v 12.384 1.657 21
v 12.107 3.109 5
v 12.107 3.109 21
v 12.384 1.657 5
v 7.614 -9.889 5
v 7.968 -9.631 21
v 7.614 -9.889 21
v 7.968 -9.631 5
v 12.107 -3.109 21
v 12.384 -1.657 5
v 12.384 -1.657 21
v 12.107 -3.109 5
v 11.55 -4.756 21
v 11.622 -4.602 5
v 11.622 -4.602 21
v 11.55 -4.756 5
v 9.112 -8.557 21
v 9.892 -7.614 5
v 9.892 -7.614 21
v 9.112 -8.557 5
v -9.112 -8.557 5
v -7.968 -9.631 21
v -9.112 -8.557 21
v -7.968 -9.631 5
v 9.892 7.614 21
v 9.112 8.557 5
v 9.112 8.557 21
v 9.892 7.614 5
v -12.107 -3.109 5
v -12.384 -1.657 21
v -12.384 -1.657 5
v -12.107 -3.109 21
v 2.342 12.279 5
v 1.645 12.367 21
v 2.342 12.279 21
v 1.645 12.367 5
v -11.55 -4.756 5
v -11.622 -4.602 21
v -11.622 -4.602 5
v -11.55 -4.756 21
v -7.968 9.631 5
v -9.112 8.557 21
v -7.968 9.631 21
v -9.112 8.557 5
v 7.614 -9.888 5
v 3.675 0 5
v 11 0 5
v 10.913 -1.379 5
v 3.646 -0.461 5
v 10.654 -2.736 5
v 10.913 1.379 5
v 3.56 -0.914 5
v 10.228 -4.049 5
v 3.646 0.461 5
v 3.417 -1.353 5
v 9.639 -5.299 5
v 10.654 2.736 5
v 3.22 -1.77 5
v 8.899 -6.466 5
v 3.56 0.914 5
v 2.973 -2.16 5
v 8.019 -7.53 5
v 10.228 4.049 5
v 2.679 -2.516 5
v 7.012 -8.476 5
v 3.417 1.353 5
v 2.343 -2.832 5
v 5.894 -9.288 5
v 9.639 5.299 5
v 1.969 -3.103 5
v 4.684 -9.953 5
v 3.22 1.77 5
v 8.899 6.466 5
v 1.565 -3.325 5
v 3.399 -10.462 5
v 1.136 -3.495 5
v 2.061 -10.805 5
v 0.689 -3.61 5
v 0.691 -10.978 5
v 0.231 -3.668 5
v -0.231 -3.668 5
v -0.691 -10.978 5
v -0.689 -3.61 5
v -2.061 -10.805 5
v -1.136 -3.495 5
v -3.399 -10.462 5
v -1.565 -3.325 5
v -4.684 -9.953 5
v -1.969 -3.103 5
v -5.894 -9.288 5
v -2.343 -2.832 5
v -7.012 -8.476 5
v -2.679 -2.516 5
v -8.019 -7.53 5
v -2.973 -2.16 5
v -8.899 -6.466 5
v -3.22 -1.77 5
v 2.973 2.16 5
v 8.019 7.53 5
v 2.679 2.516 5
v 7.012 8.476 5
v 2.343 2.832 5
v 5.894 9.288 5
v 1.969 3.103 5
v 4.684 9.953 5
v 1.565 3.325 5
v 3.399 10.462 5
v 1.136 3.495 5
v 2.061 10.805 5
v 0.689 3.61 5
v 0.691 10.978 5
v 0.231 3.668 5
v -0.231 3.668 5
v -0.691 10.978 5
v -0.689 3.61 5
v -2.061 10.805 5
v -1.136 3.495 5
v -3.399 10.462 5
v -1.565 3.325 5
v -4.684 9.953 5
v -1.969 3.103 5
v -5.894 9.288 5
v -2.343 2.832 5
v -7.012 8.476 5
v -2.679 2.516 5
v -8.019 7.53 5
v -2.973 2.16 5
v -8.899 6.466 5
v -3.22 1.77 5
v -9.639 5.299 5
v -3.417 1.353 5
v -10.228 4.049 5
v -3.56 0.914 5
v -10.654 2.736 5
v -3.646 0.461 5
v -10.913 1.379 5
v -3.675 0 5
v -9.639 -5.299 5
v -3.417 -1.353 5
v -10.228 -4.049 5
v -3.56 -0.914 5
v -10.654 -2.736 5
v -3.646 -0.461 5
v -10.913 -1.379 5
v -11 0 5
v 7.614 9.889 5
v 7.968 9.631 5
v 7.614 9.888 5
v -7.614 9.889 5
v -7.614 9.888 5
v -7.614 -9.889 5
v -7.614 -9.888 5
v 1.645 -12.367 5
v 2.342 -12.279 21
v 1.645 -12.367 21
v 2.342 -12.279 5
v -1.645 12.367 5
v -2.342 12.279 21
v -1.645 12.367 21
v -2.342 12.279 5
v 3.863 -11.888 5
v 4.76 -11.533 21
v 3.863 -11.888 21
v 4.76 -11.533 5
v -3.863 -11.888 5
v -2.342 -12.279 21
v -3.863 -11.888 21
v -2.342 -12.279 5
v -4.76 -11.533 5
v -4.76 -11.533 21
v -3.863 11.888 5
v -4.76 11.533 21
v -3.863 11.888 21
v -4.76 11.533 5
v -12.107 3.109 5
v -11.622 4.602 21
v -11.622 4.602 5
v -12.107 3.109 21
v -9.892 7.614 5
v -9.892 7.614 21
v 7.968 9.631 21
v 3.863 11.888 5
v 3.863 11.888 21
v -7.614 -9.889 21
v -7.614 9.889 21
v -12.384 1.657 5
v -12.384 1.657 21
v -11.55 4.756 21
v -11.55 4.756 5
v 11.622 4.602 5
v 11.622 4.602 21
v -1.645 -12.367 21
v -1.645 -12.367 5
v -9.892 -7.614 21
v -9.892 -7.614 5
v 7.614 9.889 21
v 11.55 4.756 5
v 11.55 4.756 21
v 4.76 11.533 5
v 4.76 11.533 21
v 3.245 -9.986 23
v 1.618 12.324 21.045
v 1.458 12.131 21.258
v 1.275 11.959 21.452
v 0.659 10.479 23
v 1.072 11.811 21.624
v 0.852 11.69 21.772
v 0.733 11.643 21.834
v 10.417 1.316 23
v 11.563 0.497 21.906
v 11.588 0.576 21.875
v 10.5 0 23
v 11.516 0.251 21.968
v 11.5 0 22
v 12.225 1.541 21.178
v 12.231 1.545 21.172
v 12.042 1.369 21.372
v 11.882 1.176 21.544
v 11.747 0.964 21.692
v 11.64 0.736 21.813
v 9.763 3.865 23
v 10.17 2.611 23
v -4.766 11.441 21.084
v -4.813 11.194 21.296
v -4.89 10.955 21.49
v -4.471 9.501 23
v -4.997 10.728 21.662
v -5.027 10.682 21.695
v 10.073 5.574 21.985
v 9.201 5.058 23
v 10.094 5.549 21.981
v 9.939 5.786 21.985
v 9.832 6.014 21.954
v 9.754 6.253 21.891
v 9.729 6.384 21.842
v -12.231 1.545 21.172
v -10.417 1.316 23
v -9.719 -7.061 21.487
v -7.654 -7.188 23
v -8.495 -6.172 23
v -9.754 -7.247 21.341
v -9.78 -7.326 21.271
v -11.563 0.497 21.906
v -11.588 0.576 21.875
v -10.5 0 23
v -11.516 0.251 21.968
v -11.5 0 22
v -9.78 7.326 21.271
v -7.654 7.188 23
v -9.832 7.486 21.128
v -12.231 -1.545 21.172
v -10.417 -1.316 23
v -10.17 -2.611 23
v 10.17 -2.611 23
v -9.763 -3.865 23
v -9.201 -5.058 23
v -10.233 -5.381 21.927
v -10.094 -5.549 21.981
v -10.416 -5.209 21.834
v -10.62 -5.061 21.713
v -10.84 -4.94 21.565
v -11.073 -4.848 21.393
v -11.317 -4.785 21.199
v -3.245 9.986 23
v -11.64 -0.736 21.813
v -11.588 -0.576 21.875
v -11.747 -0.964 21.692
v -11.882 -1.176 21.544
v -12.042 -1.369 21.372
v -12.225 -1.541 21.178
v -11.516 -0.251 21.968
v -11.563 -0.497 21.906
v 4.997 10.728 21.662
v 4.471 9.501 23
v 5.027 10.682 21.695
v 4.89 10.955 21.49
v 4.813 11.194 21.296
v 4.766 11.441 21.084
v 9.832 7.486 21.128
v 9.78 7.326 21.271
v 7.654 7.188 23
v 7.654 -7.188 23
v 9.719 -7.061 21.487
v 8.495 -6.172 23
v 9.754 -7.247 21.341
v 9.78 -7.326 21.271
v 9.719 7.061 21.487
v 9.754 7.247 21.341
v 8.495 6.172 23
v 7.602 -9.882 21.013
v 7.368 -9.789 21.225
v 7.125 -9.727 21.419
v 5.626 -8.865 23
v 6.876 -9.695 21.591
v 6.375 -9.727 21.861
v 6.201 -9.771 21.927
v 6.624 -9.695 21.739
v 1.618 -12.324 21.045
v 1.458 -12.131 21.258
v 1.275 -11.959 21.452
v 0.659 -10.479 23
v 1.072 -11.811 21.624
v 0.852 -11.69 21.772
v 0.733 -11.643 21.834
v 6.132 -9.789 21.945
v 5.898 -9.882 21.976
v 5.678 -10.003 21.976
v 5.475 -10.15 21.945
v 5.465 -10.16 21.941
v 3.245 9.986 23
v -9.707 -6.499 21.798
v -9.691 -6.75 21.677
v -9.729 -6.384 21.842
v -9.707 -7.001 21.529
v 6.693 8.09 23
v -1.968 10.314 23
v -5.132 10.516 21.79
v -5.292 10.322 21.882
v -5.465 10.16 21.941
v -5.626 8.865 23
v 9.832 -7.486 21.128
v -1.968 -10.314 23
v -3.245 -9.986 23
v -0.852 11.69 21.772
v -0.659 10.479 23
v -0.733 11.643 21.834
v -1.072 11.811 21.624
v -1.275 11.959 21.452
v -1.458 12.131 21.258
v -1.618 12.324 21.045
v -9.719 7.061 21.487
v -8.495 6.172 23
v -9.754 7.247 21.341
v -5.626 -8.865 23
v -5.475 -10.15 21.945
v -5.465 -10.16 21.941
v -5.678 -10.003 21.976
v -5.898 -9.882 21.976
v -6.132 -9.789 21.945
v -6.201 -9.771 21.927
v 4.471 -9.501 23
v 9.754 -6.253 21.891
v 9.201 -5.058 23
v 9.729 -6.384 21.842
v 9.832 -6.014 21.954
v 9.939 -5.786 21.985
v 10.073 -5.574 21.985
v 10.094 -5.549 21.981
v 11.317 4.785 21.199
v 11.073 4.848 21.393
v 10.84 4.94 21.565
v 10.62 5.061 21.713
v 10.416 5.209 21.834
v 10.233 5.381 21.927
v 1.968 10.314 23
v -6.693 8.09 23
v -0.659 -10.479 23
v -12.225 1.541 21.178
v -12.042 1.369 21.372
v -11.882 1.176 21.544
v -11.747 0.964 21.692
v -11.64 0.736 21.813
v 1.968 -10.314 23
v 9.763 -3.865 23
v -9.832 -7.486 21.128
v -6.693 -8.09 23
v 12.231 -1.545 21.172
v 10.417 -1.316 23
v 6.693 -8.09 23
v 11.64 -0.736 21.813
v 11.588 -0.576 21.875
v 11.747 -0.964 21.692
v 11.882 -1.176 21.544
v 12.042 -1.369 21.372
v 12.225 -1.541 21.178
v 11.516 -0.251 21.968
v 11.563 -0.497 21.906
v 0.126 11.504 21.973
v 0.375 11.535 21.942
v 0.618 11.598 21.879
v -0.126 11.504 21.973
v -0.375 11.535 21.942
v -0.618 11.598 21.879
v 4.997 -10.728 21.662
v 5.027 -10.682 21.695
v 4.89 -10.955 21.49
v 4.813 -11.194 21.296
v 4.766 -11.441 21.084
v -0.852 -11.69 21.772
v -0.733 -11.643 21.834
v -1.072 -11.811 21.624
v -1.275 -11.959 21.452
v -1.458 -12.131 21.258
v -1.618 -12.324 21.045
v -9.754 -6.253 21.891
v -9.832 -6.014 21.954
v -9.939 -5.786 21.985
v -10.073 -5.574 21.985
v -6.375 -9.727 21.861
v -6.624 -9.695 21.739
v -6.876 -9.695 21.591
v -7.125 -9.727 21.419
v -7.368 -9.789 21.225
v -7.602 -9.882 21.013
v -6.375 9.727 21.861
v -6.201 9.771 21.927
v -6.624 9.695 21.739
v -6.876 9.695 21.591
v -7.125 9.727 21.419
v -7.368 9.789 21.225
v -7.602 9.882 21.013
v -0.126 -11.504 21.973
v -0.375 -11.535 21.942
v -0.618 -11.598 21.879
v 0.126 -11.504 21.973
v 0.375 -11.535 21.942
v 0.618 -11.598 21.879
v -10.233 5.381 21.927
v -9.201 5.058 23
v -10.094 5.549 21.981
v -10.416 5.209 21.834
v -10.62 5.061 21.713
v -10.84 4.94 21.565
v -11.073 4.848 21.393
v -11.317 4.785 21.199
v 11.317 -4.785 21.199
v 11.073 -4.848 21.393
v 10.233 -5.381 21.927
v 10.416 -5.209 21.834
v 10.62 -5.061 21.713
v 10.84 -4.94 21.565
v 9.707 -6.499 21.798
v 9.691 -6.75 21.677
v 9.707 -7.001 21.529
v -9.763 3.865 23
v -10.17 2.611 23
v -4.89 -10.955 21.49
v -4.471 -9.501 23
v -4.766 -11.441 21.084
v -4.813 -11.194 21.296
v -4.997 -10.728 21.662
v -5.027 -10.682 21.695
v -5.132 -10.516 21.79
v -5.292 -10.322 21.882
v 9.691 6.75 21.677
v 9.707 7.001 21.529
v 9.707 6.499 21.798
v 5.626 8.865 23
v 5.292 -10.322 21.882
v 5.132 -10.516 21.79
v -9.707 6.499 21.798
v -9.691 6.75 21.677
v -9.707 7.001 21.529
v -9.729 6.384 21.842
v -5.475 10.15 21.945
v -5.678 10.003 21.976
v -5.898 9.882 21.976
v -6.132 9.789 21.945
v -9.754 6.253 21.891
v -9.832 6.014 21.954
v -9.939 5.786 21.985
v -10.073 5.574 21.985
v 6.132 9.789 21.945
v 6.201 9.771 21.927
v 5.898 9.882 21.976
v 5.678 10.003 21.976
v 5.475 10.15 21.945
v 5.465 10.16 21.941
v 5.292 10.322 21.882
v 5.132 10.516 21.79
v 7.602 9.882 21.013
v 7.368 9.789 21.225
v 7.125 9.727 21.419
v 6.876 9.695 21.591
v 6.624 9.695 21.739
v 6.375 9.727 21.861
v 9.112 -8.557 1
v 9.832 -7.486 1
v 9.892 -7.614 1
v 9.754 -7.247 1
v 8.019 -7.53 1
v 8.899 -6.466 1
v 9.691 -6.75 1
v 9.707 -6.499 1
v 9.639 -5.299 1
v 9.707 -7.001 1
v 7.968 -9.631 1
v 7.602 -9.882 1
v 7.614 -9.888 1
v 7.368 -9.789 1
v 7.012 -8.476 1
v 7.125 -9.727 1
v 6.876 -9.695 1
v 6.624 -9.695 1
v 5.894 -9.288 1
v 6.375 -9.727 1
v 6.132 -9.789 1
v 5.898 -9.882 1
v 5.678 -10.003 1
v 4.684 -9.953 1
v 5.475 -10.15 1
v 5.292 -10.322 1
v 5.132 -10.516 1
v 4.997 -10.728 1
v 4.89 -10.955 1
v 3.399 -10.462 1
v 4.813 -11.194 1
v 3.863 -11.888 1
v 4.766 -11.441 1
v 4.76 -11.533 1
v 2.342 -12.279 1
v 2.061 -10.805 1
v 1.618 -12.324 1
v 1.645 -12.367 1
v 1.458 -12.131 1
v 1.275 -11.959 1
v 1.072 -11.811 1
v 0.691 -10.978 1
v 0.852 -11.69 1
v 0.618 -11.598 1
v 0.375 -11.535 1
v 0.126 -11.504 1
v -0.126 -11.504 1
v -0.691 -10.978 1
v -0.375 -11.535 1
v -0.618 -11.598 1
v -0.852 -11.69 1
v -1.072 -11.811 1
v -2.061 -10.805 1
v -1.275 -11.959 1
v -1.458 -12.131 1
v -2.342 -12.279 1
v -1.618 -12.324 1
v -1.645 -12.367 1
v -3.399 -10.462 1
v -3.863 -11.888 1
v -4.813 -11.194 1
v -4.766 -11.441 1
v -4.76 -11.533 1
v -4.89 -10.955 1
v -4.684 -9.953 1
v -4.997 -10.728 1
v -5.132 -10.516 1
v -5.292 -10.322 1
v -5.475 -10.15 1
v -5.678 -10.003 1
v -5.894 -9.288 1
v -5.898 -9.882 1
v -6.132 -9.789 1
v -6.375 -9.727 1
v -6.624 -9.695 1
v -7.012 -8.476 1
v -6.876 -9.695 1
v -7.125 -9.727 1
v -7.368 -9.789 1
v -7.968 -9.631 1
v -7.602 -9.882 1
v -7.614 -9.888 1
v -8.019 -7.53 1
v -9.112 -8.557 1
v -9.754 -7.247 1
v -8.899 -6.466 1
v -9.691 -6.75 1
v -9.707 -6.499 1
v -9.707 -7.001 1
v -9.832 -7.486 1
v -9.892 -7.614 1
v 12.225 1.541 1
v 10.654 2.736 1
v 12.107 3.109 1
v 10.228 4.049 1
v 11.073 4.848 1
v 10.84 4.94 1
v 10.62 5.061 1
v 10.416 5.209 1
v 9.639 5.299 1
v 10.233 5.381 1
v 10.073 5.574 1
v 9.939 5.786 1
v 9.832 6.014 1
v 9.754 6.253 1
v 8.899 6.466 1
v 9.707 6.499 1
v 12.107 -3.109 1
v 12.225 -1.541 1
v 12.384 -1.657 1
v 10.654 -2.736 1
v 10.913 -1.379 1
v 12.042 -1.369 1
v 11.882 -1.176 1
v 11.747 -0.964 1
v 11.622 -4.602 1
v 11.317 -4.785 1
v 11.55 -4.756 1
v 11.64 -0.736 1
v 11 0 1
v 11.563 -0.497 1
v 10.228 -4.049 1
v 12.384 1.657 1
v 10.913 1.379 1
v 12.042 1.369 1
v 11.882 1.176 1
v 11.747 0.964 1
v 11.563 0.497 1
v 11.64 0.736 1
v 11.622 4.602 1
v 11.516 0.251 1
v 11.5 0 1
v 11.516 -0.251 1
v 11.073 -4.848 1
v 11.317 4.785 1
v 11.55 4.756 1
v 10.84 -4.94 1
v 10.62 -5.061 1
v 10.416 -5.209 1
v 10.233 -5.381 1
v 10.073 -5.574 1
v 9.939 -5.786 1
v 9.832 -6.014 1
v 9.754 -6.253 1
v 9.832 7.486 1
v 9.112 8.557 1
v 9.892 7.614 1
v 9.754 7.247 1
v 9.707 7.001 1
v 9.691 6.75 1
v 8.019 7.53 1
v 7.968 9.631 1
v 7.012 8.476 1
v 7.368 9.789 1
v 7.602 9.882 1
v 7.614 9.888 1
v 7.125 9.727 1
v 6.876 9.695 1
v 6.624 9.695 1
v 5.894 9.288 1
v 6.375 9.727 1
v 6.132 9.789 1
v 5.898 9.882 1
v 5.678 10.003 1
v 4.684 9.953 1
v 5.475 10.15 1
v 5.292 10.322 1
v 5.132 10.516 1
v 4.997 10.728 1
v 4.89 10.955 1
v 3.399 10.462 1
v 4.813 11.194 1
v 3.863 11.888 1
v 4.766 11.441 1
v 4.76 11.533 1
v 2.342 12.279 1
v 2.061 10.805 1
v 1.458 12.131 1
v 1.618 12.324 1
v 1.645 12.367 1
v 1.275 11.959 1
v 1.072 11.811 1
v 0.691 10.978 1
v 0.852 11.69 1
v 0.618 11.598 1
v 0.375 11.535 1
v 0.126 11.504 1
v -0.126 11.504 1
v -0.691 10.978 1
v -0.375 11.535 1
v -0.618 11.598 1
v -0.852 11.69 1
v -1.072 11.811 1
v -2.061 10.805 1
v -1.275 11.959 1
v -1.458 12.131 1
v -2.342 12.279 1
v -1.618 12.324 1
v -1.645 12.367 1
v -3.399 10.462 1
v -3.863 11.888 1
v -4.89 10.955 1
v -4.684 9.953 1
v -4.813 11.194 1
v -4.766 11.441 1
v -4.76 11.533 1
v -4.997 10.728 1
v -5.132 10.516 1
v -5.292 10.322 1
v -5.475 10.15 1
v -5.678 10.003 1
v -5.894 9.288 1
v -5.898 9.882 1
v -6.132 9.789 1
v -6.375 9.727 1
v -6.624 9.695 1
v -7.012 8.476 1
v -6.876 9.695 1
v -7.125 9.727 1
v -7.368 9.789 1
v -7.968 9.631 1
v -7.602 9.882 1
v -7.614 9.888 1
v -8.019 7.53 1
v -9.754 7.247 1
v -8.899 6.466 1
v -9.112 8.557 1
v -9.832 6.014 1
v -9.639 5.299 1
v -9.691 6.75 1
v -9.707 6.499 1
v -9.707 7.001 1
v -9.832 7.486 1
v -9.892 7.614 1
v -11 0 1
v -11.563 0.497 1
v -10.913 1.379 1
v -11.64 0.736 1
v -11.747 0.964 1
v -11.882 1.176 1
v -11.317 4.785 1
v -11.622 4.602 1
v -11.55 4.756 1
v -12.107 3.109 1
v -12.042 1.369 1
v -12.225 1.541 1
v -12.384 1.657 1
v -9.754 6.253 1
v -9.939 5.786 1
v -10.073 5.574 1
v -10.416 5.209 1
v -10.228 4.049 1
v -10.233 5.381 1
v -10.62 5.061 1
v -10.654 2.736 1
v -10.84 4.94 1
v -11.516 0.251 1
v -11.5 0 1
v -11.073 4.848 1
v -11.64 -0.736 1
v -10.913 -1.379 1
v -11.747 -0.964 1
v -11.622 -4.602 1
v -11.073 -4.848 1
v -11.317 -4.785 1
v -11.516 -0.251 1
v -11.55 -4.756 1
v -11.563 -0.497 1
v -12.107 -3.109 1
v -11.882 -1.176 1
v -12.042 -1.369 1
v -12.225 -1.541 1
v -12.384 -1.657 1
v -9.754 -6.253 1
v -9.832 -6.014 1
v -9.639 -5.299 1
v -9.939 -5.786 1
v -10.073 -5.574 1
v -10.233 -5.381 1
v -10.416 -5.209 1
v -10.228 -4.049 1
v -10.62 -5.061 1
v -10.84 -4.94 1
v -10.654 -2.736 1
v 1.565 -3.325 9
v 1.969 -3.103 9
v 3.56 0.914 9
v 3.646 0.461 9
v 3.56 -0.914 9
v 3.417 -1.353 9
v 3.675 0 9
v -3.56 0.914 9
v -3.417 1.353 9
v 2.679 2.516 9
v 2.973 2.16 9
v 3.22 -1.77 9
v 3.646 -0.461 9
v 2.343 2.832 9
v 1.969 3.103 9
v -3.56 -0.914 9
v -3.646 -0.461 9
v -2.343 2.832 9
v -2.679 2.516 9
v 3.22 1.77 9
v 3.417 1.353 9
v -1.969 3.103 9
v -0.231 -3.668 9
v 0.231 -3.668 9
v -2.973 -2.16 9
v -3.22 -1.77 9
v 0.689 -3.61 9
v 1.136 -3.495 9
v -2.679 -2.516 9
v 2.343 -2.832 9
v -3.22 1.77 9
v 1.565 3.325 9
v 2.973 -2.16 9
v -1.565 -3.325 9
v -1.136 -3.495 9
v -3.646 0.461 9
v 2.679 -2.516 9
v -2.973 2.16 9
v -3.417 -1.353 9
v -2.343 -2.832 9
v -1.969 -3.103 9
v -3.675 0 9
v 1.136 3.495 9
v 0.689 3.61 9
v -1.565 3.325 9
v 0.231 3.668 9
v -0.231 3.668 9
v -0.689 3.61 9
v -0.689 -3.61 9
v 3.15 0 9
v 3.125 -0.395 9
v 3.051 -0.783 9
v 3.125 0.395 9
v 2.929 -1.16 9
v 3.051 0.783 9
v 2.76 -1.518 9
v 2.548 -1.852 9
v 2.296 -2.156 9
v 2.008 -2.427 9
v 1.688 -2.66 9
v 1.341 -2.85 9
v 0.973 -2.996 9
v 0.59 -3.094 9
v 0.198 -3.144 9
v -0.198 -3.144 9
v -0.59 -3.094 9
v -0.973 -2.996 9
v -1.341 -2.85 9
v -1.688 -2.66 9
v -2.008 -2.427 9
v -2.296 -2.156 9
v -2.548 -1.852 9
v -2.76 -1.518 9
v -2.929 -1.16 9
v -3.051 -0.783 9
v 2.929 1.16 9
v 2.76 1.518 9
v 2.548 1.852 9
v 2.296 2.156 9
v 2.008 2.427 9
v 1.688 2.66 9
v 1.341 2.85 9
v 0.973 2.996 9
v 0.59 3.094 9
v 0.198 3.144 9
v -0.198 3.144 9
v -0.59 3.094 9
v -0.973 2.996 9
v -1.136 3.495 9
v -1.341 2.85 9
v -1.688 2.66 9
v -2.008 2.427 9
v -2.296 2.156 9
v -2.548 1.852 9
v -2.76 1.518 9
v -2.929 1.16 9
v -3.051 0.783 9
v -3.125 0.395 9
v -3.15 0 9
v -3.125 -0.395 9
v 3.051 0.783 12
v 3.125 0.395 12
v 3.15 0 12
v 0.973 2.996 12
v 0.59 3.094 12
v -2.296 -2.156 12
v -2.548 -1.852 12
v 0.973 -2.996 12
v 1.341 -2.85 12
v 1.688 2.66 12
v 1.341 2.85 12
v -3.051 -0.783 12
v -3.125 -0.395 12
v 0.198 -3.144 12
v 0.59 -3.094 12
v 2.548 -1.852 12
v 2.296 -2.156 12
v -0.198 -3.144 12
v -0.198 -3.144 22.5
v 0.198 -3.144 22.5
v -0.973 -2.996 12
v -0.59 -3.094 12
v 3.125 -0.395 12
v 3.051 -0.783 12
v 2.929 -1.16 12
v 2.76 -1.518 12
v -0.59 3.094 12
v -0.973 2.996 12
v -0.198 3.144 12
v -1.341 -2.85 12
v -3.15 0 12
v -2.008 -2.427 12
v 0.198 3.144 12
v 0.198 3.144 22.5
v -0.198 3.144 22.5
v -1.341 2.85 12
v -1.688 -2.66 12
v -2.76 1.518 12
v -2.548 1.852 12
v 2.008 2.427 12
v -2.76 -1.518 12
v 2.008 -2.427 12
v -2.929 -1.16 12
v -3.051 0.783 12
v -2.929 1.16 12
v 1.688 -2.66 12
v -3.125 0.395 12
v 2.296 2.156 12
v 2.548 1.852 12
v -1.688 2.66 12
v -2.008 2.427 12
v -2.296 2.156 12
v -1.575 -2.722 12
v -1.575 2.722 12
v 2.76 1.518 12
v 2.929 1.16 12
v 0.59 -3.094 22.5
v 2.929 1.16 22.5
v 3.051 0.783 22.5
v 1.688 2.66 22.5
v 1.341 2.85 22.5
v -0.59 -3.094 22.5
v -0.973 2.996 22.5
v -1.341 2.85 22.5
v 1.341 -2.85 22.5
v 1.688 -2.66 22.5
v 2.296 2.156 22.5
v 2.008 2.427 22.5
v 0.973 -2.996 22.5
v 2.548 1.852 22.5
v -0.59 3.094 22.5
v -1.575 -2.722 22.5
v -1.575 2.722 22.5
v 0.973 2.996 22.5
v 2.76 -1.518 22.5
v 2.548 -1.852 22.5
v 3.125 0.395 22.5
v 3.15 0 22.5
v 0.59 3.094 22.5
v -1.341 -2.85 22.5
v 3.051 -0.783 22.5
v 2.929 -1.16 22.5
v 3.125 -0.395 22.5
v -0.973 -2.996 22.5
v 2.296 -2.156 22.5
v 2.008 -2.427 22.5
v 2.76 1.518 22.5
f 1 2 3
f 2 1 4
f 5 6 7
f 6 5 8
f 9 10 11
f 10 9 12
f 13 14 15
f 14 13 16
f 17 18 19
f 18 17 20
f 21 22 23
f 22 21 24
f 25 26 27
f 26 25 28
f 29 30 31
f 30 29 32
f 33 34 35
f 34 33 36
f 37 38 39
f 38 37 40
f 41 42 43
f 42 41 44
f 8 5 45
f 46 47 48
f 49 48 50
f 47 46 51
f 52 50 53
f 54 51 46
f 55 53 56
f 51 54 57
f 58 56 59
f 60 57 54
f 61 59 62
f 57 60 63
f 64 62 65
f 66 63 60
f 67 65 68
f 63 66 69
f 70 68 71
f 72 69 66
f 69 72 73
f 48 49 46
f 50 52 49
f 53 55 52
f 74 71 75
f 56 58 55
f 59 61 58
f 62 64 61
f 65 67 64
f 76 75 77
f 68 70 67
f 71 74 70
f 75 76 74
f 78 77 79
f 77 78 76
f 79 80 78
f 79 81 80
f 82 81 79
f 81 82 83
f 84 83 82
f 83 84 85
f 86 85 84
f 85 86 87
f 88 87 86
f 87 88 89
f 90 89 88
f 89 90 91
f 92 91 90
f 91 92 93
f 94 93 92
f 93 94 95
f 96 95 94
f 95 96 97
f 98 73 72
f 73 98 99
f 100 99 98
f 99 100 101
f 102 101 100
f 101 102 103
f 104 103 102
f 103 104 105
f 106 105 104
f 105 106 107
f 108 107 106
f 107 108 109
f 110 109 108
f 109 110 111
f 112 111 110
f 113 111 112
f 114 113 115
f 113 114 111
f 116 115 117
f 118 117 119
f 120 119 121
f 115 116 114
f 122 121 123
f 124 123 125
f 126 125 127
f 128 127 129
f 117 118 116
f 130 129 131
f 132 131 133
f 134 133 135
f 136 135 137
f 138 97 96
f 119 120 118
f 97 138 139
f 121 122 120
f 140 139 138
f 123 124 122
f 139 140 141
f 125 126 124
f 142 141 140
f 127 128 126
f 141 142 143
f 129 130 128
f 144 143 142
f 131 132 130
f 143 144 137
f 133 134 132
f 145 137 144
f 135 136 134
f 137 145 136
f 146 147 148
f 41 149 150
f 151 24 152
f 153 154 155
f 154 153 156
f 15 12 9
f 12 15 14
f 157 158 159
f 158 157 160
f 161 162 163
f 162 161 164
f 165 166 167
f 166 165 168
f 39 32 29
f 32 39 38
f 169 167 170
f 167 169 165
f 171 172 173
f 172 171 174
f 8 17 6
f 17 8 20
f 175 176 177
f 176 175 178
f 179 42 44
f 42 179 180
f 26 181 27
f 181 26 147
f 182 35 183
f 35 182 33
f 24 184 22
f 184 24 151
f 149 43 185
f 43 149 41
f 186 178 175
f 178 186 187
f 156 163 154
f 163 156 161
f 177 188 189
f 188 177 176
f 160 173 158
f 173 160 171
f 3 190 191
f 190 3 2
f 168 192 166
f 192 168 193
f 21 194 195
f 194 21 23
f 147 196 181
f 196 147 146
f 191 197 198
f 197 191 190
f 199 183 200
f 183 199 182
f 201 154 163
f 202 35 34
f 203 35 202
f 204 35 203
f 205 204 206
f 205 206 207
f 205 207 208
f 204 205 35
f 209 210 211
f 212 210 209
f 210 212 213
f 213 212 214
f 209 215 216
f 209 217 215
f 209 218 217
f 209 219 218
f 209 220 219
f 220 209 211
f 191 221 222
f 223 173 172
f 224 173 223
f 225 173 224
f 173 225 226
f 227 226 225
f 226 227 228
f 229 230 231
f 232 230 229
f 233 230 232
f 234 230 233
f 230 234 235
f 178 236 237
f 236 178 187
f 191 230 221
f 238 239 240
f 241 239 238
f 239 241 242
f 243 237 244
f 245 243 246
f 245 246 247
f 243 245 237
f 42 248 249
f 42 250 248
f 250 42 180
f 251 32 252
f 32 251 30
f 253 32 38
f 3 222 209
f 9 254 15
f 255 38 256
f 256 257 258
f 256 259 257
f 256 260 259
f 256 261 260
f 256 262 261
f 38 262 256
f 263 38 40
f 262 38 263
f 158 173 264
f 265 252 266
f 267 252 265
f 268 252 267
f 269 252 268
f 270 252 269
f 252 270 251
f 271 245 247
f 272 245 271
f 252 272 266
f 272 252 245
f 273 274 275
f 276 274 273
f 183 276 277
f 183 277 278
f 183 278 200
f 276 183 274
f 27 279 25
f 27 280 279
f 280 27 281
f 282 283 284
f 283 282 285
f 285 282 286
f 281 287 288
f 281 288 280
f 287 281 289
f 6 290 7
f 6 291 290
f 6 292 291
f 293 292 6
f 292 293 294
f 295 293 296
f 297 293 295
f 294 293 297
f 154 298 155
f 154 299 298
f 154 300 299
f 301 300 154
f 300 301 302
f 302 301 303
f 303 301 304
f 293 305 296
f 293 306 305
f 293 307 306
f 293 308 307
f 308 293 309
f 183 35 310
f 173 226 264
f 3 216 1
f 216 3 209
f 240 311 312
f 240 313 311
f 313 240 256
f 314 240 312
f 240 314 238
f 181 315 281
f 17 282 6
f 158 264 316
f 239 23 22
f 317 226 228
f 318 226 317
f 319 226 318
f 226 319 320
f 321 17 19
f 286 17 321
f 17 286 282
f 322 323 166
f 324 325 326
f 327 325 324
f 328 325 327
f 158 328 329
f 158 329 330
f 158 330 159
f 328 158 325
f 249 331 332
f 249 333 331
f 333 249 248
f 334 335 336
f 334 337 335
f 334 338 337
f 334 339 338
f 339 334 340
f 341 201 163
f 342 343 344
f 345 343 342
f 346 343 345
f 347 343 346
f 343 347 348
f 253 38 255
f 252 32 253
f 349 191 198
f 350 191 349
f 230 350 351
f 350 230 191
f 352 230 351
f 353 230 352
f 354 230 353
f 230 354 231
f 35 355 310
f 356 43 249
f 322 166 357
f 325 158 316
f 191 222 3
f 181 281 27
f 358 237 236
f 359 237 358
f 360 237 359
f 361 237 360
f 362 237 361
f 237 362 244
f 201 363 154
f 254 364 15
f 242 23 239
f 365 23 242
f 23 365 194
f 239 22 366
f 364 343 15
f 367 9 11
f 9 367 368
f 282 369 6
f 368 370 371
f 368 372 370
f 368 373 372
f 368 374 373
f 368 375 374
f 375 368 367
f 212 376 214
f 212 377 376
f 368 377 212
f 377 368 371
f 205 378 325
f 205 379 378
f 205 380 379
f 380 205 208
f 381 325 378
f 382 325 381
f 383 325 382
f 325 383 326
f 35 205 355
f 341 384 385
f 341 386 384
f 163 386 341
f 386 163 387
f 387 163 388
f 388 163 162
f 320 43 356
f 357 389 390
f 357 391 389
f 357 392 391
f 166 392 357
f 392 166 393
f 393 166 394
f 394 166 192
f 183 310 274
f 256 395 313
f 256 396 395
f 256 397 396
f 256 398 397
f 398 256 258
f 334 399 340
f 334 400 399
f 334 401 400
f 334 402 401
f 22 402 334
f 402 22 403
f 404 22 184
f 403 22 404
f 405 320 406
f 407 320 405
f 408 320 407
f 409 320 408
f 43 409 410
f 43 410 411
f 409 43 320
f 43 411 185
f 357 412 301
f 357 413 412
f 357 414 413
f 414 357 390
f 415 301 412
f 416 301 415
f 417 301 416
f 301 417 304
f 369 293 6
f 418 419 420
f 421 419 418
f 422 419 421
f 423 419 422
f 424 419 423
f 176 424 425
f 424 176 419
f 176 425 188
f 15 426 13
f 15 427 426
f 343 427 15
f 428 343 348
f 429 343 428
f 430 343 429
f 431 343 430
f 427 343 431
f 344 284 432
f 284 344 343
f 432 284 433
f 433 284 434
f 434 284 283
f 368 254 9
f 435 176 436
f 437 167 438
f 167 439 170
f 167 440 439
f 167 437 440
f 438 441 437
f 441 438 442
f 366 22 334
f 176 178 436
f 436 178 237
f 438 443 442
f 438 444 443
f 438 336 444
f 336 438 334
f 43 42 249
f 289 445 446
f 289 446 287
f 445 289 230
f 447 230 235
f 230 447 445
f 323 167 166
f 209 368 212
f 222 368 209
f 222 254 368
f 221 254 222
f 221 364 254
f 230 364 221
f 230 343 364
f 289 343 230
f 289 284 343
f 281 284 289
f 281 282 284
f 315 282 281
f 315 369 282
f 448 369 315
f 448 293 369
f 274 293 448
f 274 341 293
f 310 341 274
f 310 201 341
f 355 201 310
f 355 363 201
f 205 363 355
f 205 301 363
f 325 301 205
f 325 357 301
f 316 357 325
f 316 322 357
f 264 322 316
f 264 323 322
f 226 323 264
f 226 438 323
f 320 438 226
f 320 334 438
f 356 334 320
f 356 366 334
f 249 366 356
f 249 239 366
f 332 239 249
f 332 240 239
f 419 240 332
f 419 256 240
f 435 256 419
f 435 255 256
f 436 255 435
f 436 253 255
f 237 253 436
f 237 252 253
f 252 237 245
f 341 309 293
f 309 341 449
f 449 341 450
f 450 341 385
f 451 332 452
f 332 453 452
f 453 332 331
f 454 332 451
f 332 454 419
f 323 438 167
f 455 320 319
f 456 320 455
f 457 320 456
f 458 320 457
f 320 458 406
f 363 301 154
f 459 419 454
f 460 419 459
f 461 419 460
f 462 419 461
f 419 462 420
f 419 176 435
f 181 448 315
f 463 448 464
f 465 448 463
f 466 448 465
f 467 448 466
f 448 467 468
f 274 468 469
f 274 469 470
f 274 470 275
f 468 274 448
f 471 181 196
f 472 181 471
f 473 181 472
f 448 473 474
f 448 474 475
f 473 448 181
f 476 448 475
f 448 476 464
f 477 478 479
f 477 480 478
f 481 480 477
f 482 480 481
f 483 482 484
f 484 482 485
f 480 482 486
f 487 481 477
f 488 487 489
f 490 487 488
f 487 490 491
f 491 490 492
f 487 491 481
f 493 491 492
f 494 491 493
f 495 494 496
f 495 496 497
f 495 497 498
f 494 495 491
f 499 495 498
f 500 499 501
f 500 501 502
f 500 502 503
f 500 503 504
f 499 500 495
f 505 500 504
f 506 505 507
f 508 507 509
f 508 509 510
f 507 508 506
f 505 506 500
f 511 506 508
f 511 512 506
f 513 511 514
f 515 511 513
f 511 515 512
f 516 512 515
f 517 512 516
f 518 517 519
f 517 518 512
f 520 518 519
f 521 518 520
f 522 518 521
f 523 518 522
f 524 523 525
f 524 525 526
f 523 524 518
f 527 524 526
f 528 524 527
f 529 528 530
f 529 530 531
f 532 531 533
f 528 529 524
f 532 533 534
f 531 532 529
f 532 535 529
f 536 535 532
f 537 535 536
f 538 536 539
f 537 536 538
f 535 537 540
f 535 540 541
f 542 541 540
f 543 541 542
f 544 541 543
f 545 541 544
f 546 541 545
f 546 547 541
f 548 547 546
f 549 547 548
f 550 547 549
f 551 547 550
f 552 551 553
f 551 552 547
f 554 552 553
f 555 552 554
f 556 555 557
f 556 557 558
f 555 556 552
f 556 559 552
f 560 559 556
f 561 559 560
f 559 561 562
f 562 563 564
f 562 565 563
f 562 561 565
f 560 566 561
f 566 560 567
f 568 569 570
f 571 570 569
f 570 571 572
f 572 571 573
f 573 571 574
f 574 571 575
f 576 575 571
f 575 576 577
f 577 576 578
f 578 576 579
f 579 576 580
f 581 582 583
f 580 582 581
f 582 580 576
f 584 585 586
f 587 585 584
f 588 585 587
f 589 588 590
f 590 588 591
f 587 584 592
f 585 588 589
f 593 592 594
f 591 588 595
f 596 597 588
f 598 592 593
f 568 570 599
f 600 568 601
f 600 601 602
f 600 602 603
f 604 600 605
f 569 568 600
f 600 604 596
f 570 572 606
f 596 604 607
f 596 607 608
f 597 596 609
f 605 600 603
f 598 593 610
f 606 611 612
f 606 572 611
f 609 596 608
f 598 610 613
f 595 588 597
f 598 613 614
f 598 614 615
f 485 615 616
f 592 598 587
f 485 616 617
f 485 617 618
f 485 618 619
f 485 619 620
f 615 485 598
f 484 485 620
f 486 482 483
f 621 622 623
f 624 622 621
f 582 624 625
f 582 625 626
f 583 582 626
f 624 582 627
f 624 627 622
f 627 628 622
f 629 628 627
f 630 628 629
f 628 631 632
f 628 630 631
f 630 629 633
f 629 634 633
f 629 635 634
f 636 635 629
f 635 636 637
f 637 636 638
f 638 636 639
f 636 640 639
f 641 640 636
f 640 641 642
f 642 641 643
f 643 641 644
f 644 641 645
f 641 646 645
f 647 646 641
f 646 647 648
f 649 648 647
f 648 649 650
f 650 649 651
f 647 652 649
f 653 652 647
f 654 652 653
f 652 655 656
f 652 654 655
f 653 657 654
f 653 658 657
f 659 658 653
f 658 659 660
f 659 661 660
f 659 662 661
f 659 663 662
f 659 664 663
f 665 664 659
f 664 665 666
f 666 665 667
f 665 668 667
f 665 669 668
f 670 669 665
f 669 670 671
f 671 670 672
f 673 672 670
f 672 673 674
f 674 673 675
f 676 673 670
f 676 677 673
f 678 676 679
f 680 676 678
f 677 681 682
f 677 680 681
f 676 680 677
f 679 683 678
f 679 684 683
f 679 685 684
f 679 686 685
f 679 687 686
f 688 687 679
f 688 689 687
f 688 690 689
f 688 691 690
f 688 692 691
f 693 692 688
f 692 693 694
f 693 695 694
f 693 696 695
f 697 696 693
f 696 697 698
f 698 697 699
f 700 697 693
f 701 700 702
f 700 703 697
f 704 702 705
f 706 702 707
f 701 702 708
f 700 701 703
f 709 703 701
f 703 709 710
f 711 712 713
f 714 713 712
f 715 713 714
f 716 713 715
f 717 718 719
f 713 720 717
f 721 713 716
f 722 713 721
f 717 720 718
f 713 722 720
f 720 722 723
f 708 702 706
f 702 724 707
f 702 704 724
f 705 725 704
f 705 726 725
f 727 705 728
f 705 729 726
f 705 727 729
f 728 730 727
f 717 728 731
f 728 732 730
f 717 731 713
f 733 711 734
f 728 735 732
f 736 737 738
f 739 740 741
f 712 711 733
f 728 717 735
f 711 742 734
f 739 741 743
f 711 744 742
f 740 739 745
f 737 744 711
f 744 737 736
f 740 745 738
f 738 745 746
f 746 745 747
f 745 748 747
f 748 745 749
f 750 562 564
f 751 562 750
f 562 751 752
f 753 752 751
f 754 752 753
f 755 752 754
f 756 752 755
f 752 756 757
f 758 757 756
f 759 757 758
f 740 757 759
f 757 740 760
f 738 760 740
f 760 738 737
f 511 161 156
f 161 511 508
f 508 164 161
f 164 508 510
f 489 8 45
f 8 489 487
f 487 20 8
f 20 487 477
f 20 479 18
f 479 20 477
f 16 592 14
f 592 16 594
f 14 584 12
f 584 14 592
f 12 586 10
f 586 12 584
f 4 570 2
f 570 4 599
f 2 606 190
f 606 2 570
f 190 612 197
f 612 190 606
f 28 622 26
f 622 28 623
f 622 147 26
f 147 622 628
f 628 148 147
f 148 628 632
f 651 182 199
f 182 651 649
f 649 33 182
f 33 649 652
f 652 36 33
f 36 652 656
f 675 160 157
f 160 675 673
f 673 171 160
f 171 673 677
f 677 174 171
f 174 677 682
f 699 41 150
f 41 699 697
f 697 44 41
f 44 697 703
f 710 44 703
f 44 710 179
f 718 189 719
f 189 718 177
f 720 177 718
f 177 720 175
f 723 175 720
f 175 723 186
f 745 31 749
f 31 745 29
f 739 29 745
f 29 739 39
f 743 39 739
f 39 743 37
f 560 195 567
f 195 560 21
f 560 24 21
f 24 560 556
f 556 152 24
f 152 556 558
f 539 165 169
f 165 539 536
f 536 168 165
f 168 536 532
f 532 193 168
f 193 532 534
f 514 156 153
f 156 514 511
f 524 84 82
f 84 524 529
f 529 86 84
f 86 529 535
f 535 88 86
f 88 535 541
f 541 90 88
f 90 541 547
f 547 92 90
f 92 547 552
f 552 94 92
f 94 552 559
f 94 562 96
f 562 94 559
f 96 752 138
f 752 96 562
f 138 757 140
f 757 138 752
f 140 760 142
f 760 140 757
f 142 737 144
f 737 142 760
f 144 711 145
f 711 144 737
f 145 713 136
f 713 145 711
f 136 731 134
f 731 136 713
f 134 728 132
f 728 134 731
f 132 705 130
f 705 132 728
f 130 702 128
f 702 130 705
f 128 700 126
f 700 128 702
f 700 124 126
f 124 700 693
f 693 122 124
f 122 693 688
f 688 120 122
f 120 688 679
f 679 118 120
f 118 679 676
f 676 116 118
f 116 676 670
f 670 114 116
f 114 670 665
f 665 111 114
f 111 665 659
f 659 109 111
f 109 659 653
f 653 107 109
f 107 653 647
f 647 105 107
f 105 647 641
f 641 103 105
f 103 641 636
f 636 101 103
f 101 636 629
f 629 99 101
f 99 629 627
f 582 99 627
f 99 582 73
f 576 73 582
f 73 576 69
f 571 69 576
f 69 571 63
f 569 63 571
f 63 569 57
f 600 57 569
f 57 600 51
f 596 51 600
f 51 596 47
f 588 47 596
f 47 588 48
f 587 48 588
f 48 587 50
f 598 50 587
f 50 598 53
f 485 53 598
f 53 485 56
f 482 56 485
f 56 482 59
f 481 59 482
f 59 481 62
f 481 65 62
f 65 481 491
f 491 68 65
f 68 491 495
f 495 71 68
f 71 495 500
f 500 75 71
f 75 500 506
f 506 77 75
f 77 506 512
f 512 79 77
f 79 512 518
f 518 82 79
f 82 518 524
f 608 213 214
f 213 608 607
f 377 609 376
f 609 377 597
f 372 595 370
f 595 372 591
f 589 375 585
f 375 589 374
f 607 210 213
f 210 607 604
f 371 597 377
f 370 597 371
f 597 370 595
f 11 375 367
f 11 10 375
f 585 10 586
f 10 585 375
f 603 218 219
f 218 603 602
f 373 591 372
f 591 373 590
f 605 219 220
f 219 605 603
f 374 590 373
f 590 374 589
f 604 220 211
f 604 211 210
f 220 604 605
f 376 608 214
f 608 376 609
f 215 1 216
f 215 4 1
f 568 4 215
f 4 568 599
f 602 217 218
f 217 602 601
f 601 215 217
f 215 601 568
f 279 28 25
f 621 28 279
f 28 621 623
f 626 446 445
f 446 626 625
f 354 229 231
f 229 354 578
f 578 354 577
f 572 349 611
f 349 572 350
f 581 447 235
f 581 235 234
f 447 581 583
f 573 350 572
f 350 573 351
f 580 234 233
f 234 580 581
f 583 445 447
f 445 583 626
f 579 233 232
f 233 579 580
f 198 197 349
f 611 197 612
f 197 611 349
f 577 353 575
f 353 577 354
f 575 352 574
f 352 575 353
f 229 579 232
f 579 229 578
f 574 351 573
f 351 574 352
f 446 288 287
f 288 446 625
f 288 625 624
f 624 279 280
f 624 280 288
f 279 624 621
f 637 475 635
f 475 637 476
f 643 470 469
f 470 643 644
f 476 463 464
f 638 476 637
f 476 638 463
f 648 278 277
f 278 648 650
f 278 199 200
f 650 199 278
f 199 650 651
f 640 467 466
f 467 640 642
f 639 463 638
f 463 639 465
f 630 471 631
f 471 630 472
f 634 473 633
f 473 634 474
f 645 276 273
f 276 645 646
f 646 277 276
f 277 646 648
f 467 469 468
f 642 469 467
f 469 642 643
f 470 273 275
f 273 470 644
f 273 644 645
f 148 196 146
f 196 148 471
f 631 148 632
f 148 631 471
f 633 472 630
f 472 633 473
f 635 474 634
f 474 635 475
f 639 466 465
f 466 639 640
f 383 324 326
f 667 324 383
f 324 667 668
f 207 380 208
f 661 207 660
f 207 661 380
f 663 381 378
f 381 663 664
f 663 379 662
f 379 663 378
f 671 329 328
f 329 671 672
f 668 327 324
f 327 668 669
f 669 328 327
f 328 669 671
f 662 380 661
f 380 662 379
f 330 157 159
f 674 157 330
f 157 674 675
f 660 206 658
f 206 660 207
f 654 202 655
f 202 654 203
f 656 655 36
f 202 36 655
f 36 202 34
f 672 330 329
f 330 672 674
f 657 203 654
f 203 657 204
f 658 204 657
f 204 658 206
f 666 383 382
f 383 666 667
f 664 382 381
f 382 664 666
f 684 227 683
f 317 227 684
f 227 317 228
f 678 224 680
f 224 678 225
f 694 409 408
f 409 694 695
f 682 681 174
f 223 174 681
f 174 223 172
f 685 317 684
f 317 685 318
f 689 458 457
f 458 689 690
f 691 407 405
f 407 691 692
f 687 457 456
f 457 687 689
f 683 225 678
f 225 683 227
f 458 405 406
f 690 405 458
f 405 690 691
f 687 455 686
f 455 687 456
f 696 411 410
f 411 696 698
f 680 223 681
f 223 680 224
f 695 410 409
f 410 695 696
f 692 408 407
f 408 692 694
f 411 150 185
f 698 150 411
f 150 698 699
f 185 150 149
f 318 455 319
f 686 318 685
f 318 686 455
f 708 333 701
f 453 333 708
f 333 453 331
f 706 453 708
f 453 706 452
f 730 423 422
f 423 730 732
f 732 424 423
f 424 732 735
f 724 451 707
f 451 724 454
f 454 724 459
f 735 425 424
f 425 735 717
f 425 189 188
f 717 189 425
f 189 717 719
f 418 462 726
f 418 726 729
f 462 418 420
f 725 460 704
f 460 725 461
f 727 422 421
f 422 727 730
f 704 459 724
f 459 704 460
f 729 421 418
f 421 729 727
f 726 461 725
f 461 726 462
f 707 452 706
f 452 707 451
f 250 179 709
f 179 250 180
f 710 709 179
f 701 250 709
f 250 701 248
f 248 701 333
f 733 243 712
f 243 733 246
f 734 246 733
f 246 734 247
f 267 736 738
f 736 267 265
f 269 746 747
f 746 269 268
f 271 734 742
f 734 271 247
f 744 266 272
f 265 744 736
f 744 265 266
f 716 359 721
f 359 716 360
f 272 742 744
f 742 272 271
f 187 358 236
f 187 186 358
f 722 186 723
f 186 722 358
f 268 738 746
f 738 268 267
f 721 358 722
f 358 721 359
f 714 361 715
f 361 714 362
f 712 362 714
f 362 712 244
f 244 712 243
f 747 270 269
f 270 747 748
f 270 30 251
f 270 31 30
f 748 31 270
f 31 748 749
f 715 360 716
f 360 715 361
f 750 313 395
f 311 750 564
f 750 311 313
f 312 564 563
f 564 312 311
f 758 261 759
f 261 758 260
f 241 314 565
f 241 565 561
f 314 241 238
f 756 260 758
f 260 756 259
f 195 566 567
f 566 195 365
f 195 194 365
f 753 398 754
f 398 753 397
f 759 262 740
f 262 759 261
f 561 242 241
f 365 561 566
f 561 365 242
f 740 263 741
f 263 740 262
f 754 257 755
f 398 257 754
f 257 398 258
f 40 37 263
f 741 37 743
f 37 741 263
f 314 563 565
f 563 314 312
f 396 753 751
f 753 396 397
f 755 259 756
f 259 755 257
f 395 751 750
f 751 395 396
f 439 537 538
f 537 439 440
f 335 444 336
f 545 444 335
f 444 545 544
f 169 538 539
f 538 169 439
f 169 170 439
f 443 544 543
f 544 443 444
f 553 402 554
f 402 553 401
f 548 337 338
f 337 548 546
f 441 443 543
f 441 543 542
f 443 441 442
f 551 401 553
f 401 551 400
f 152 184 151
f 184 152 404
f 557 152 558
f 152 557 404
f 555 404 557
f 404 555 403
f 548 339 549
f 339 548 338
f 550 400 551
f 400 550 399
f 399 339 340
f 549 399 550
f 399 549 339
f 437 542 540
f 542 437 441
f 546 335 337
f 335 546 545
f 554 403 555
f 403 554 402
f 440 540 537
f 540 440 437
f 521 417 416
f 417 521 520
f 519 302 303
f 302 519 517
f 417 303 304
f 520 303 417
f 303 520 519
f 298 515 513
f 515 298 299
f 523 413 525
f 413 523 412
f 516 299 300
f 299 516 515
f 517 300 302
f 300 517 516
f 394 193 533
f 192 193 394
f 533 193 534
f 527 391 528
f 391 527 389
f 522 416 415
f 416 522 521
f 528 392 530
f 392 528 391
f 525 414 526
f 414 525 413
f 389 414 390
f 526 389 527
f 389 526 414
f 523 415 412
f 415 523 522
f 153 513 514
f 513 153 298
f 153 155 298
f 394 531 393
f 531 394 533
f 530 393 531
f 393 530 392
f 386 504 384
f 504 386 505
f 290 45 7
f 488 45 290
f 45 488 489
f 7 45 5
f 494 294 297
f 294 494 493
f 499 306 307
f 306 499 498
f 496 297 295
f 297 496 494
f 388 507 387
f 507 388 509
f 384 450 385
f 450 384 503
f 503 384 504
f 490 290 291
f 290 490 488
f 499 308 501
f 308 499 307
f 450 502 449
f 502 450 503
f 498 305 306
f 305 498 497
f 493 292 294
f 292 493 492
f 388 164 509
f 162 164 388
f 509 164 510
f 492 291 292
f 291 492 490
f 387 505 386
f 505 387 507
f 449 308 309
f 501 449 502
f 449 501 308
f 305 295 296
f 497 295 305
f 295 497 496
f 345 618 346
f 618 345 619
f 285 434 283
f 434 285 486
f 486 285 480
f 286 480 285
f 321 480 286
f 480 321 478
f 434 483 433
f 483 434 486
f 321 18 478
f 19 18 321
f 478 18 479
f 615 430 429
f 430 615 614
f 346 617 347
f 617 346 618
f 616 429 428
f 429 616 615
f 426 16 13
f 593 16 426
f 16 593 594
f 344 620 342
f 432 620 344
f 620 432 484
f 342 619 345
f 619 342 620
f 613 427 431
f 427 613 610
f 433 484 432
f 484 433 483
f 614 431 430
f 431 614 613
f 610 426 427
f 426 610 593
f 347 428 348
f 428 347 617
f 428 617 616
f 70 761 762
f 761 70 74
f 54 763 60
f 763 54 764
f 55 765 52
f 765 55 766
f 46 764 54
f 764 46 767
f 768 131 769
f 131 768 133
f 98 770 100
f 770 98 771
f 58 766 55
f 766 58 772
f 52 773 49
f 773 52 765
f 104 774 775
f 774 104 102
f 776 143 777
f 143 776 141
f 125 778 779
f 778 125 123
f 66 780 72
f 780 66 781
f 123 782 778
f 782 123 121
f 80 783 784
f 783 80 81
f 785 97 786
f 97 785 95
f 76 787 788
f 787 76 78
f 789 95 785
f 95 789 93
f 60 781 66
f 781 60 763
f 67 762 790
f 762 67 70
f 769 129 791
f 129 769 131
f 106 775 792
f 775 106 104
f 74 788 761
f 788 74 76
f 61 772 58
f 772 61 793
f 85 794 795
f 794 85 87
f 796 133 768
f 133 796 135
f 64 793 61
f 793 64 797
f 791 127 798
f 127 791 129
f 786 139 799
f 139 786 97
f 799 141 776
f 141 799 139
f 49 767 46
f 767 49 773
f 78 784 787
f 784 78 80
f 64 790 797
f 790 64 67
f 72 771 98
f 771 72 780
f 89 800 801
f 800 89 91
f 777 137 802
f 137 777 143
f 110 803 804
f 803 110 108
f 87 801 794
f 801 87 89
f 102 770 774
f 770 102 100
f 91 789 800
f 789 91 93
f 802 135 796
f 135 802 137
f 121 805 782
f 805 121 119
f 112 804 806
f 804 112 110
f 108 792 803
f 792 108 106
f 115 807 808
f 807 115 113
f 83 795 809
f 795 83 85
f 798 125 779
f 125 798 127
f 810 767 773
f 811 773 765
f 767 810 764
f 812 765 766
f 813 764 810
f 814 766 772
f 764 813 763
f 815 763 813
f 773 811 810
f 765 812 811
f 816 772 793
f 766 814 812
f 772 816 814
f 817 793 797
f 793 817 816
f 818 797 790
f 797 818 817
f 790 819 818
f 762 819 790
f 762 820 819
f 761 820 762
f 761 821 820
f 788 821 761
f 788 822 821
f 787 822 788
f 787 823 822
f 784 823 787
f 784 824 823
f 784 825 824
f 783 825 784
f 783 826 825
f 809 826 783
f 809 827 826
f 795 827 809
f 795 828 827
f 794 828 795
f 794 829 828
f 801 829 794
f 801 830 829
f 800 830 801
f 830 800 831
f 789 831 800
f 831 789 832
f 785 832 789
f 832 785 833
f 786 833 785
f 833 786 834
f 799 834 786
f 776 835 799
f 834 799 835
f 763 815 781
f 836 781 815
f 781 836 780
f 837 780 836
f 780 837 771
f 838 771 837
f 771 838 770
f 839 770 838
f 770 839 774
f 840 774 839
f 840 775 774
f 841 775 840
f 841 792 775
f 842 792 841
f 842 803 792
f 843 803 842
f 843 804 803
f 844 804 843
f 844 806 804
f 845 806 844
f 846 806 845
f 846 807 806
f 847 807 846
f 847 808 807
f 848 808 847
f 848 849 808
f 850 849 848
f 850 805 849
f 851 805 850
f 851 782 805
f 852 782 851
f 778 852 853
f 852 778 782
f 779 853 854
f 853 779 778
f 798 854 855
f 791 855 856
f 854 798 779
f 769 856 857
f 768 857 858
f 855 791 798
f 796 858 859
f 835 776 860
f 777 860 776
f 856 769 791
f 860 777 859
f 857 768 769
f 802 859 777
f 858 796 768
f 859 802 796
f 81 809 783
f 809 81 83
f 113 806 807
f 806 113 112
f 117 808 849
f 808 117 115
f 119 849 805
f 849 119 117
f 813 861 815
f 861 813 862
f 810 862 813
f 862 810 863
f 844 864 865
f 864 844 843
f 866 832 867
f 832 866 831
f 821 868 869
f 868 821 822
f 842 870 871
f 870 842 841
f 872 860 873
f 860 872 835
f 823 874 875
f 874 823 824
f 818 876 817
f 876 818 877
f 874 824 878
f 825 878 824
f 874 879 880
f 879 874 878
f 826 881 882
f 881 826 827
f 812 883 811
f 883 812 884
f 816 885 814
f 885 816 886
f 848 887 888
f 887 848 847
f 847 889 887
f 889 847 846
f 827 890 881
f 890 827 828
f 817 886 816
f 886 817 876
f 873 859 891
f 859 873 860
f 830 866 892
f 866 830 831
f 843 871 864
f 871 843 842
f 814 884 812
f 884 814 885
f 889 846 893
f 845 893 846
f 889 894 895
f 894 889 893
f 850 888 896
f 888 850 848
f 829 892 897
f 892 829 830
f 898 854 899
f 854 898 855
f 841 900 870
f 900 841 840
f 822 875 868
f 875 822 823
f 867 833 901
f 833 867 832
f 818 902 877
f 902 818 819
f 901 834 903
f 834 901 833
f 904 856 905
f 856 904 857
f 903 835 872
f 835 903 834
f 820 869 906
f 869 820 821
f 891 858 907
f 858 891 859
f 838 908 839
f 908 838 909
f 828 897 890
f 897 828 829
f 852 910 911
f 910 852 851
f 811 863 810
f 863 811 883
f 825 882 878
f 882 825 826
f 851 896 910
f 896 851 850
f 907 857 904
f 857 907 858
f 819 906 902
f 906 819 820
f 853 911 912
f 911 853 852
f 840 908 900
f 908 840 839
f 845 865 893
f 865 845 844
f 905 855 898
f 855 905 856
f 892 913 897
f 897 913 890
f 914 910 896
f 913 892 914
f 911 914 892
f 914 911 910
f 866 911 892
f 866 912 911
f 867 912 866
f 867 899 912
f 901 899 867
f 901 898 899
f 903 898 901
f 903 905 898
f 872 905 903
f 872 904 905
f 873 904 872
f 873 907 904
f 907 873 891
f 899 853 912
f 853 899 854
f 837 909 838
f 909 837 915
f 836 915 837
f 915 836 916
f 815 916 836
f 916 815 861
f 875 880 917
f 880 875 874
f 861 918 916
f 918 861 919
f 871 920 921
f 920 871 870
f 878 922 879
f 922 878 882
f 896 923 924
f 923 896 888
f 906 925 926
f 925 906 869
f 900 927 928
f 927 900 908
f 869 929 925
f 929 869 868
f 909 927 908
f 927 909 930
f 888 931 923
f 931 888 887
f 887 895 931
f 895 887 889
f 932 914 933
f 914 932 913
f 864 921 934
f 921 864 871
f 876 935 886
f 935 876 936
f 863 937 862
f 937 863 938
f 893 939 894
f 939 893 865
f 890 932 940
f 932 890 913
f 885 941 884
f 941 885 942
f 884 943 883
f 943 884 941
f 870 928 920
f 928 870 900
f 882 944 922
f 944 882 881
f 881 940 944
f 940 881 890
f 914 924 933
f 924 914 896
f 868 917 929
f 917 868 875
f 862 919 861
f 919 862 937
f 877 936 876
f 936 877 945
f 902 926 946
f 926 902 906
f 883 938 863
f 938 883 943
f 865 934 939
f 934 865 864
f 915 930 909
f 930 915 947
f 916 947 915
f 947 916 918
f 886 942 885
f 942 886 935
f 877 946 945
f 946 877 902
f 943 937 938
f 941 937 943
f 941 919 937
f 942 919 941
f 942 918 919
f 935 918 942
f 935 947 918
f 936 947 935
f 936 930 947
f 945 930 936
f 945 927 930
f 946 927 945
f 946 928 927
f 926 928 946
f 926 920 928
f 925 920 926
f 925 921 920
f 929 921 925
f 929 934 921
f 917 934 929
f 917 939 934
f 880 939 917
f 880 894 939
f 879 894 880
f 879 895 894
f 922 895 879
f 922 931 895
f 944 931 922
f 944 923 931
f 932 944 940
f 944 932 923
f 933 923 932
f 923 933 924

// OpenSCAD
h1 = 7; // The thickest bottom part
d1 = 7; // Diameter of the bottom part
h2 = 3; // Height until the flattened section
d2 = 6; // (max) Diameter of the rest of the spine
h3 = 10.5; // Height of the rest of the spine
flat_spine_width = 4.5; // The width where the top of the spine is flattened

knob_height = 20;
knob_diameter = 25;
knob_y_offset = 1;

skirt_height = 4;
skirt_thickness = 3;

top_chamfer = 2;

spine_cutout_scale = 1.05;

$fn = 50;

model();

module model() {
    difference() {
        #encoder_body();
        translate([0, 0, 2]) {
            encoder_spine_cutout();
        }
    }
}

module encoder_body() {
    difference() {
        union() {
            translate([0, 0, knob_y_offset]) {
                linear_extrude(skirt_height) {
                    difference() {
                        circle(d = knob_diameter);
                        circle(d = knob_diameter - skirt_thickness);
                    }
                }
            }

            translate([0, 0, knob_y_offset + skirt_height]) {
                union() {
                    linear_extrude(knob_height - skirt_height) {
                        circle(d = knob_diameter);
                    }


                    translate([0, 0, knob_height - skirt_height]) {
                        cylinder(h = top_chamfer, d1 = knob_diameter, d2 = knob_diameter - top_chamfer * 2);
                    }
                }
            }

        }

        union() {
            for (a = [0 : 30 : 360]) {
                x = cos(a) * (knob_diameter / 2 + 1);
                y = sin(a) * (knob_diameter / 2 + 1);

                translate([x, y]) {
                    linear_extrude(knob_height + top_chamfer + skirt_height) {
                        circle(2);
                    }
                }
            }
        }
    }
}

module encoder_spine_cutout() {
    scale([spine_cutout_scale, spine_cutout_scale]) {
        linear_extrude(h1) {
            circle(d = d1);
        }

        translate([0, 0, h1]) {
            linear_extrude(h2) {
                circle(d = d2);
            }
        }

        translate([0, 0, h1 + h2]) {
            linear_extrude(h3) {
                intersection() {
                    circle(d = d2);
                    translate([-(d2 - flat_spine_width), -d2 / 2]) {
                        square([flat_spine_width, d2]);
                    }
                }
            }
        }
    }
}
